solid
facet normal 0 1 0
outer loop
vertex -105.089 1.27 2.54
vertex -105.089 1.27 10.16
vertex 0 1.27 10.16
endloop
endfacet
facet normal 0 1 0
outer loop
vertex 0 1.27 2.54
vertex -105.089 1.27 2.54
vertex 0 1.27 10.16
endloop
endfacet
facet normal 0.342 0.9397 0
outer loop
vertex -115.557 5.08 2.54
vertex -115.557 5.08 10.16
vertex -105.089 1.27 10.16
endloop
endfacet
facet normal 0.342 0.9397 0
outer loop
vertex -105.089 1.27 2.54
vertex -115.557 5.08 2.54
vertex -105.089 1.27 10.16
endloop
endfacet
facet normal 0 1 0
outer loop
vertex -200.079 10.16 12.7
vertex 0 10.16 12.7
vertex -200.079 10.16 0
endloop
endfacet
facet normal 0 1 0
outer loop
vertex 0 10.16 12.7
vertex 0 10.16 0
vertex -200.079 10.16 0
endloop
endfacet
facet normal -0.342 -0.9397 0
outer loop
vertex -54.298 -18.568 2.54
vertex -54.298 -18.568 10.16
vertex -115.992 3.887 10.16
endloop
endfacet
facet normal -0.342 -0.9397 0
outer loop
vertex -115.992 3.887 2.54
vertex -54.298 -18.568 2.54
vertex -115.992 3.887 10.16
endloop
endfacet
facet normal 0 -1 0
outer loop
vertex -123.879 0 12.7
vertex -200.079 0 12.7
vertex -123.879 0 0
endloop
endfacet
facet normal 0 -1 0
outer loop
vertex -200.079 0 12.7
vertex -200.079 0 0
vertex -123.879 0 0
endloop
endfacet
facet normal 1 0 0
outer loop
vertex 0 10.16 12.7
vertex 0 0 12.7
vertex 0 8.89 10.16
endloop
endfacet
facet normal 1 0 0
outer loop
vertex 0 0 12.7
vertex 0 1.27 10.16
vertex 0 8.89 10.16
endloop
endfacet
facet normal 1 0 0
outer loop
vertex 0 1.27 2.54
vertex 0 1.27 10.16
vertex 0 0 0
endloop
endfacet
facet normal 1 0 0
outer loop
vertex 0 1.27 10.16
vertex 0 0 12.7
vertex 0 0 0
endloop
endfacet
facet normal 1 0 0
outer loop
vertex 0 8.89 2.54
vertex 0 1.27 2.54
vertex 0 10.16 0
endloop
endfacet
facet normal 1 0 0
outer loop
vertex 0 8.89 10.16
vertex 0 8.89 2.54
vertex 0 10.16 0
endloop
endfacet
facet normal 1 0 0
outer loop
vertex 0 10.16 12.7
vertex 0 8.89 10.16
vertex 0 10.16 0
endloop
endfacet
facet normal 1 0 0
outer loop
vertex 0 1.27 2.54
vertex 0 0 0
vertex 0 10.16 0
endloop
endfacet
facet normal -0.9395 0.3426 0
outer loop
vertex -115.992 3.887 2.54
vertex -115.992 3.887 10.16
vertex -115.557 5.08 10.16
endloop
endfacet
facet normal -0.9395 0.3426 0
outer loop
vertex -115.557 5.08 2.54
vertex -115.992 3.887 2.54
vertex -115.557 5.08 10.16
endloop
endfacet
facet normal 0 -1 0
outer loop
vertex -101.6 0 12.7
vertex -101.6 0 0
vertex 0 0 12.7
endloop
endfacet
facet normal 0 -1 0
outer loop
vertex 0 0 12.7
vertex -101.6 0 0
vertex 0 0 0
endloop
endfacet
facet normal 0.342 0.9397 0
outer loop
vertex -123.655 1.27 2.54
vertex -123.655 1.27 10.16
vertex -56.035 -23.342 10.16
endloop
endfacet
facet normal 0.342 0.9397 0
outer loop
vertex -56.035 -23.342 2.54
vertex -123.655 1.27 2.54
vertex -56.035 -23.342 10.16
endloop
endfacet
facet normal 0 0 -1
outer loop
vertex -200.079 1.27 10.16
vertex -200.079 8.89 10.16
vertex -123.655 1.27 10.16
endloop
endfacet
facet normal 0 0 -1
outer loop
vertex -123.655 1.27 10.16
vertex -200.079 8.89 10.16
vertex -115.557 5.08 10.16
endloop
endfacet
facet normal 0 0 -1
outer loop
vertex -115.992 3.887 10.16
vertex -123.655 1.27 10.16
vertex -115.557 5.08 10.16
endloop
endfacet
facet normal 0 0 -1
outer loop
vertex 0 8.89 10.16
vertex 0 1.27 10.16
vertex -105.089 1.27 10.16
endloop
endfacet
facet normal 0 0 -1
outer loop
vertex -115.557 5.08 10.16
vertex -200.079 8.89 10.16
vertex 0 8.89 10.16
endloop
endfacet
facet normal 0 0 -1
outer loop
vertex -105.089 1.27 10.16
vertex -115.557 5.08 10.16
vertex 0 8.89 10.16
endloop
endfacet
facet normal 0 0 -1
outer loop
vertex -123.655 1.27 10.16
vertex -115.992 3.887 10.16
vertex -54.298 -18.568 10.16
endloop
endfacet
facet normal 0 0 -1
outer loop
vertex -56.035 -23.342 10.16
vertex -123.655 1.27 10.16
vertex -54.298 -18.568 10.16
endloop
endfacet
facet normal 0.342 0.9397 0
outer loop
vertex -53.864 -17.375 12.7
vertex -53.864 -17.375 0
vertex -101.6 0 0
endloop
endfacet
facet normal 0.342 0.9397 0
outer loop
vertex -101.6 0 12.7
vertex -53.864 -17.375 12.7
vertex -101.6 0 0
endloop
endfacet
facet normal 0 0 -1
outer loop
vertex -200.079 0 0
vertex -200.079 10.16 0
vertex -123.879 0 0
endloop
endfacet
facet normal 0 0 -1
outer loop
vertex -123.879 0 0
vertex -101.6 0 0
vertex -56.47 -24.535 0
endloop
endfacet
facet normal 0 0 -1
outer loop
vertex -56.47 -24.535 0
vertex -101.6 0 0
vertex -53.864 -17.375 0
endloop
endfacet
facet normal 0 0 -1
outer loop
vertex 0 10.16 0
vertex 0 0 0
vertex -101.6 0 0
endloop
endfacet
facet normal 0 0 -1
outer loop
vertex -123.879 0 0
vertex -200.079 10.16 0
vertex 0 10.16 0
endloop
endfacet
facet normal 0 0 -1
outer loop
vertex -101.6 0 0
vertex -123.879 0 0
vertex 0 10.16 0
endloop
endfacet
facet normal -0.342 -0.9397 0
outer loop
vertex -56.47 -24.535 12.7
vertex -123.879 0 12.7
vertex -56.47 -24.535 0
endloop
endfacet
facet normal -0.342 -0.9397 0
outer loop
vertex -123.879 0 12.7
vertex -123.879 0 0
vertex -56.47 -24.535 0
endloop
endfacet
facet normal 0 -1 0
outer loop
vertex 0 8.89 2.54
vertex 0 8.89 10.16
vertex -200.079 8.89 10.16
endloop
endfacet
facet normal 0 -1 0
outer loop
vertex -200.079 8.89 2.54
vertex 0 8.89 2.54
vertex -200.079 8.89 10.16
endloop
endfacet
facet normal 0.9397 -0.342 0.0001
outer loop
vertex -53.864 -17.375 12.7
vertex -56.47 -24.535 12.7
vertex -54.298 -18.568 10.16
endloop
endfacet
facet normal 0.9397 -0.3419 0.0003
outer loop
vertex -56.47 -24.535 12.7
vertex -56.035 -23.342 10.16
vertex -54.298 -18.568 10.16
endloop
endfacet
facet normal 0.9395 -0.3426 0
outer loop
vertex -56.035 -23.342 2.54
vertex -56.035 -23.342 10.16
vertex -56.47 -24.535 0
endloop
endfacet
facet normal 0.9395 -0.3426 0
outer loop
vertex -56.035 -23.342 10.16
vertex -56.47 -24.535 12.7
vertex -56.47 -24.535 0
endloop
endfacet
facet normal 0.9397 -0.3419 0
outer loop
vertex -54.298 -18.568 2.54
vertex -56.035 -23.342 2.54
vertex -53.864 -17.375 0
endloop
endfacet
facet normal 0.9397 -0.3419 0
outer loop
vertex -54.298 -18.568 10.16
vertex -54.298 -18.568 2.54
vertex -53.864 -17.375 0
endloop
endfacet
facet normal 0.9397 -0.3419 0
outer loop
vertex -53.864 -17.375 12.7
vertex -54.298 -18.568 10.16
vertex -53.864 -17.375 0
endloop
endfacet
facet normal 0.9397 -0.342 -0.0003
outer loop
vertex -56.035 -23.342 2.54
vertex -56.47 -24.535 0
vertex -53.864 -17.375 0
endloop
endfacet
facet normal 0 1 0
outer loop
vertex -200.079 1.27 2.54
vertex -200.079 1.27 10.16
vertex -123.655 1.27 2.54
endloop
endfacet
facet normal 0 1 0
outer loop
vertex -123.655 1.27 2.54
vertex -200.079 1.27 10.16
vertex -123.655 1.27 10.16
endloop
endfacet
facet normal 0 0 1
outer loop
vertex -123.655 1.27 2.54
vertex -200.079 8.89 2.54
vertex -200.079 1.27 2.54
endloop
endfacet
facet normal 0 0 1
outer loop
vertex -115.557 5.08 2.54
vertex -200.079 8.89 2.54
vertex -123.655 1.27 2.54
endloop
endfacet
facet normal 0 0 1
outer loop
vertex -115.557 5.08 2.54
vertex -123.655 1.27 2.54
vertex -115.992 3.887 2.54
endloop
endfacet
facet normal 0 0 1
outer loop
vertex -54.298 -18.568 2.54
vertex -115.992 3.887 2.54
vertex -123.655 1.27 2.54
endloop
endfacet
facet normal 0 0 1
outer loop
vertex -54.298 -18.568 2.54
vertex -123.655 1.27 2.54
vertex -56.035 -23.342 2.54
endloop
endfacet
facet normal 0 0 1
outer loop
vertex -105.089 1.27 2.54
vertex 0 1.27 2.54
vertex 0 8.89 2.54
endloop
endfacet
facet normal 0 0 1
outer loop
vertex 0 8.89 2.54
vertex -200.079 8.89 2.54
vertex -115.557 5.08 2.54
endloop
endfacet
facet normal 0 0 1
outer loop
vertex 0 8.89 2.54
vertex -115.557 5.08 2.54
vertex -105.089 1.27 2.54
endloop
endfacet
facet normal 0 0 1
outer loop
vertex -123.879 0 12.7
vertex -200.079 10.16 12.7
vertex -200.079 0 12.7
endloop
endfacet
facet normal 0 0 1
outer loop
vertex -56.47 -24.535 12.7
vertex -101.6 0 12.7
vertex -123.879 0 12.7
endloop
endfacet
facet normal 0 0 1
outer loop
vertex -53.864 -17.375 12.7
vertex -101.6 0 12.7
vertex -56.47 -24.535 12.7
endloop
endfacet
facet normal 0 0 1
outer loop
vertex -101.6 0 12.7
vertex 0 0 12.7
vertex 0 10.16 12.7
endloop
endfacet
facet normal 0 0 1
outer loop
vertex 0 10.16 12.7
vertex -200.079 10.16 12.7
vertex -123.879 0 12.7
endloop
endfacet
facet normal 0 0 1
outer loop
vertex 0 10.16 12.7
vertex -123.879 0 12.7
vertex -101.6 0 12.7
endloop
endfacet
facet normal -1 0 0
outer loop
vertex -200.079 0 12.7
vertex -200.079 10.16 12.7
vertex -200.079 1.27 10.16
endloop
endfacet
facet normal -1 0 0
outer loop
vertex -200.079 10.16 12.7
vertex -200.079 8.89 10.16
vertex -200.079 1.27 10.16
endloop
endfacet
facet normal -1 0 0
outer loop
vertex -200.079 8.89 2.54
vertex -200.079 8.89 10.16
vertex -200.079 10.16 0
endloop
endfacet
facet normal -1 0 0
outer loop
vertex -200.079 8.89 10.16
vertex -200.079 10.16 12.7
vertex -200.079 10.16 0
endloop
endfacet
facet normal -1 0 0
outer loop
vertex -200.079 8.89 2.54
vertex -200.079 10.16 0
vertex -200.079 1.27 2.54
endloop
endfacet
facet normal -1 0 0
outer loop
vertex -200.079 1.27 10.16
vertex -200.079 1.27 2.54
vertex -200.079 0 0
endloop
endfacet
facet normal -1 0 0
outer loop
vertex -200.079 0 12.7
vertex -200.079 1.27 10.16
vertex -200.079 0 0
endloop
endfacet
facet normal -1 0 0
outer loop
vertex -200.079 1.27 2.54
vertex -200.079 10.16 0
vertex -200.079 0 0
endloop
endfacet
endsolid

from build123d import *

# Parameters (mm, degrees)
F1_DEPTH = 10.16
F3_DEPTH = 7.62
F5_DEPTH = 2.54


with BuildPart() as f1:
    # F0 (on Top) → F1 (new body)
    with BuildSketch(Plane.XY):
        Polygon((-101.6, 0), (0, 0), (0, 10.16), (-200.0793895292, 10.16), (-200.0793895292, 0), (-123.8793895292, 0), (-56.4698083562, -24.5350810513), (-53.8636148641, -17.3746232809), align=None)
    extrude(amount=F1_DEPTH)

    # F2 (on face) → F3 (cut)
    with BuildSketch(Plane.XY.offset(10.16)):
        Polygon((-54.2979804461, -18.5680329093), (-115.9915508729, 3.8865903716), (-115.5571852908, 5.08), (-105.0892963227, 1.27), (0, 1.27), (0, 8.89), (-200.0793895292, 8.89), (-200.0793895292, 1.27), (-123.6554542637, 1.27), (-56.0354427742, -23.3416714229), align=None)
    extrude(amount=-F3_DEPTH, mode=Mode.SUBTRACT)

    # F4 (on face) → F5 (join)
    with BuildSketch(Plane.XY.offset(10.16)):
        Polygon((-101.6, 0), (0, 0), (0, 10.16), (-200.0793895292, 10.16), (-200.0793895292, 0), (-123.8793895292, 0), (-56.4698083562, -24.5350810513), (-53.8636148641, -17.3746232809), align=None)
    extrude(amount=F5_DEPTH)


solid = f1.part
